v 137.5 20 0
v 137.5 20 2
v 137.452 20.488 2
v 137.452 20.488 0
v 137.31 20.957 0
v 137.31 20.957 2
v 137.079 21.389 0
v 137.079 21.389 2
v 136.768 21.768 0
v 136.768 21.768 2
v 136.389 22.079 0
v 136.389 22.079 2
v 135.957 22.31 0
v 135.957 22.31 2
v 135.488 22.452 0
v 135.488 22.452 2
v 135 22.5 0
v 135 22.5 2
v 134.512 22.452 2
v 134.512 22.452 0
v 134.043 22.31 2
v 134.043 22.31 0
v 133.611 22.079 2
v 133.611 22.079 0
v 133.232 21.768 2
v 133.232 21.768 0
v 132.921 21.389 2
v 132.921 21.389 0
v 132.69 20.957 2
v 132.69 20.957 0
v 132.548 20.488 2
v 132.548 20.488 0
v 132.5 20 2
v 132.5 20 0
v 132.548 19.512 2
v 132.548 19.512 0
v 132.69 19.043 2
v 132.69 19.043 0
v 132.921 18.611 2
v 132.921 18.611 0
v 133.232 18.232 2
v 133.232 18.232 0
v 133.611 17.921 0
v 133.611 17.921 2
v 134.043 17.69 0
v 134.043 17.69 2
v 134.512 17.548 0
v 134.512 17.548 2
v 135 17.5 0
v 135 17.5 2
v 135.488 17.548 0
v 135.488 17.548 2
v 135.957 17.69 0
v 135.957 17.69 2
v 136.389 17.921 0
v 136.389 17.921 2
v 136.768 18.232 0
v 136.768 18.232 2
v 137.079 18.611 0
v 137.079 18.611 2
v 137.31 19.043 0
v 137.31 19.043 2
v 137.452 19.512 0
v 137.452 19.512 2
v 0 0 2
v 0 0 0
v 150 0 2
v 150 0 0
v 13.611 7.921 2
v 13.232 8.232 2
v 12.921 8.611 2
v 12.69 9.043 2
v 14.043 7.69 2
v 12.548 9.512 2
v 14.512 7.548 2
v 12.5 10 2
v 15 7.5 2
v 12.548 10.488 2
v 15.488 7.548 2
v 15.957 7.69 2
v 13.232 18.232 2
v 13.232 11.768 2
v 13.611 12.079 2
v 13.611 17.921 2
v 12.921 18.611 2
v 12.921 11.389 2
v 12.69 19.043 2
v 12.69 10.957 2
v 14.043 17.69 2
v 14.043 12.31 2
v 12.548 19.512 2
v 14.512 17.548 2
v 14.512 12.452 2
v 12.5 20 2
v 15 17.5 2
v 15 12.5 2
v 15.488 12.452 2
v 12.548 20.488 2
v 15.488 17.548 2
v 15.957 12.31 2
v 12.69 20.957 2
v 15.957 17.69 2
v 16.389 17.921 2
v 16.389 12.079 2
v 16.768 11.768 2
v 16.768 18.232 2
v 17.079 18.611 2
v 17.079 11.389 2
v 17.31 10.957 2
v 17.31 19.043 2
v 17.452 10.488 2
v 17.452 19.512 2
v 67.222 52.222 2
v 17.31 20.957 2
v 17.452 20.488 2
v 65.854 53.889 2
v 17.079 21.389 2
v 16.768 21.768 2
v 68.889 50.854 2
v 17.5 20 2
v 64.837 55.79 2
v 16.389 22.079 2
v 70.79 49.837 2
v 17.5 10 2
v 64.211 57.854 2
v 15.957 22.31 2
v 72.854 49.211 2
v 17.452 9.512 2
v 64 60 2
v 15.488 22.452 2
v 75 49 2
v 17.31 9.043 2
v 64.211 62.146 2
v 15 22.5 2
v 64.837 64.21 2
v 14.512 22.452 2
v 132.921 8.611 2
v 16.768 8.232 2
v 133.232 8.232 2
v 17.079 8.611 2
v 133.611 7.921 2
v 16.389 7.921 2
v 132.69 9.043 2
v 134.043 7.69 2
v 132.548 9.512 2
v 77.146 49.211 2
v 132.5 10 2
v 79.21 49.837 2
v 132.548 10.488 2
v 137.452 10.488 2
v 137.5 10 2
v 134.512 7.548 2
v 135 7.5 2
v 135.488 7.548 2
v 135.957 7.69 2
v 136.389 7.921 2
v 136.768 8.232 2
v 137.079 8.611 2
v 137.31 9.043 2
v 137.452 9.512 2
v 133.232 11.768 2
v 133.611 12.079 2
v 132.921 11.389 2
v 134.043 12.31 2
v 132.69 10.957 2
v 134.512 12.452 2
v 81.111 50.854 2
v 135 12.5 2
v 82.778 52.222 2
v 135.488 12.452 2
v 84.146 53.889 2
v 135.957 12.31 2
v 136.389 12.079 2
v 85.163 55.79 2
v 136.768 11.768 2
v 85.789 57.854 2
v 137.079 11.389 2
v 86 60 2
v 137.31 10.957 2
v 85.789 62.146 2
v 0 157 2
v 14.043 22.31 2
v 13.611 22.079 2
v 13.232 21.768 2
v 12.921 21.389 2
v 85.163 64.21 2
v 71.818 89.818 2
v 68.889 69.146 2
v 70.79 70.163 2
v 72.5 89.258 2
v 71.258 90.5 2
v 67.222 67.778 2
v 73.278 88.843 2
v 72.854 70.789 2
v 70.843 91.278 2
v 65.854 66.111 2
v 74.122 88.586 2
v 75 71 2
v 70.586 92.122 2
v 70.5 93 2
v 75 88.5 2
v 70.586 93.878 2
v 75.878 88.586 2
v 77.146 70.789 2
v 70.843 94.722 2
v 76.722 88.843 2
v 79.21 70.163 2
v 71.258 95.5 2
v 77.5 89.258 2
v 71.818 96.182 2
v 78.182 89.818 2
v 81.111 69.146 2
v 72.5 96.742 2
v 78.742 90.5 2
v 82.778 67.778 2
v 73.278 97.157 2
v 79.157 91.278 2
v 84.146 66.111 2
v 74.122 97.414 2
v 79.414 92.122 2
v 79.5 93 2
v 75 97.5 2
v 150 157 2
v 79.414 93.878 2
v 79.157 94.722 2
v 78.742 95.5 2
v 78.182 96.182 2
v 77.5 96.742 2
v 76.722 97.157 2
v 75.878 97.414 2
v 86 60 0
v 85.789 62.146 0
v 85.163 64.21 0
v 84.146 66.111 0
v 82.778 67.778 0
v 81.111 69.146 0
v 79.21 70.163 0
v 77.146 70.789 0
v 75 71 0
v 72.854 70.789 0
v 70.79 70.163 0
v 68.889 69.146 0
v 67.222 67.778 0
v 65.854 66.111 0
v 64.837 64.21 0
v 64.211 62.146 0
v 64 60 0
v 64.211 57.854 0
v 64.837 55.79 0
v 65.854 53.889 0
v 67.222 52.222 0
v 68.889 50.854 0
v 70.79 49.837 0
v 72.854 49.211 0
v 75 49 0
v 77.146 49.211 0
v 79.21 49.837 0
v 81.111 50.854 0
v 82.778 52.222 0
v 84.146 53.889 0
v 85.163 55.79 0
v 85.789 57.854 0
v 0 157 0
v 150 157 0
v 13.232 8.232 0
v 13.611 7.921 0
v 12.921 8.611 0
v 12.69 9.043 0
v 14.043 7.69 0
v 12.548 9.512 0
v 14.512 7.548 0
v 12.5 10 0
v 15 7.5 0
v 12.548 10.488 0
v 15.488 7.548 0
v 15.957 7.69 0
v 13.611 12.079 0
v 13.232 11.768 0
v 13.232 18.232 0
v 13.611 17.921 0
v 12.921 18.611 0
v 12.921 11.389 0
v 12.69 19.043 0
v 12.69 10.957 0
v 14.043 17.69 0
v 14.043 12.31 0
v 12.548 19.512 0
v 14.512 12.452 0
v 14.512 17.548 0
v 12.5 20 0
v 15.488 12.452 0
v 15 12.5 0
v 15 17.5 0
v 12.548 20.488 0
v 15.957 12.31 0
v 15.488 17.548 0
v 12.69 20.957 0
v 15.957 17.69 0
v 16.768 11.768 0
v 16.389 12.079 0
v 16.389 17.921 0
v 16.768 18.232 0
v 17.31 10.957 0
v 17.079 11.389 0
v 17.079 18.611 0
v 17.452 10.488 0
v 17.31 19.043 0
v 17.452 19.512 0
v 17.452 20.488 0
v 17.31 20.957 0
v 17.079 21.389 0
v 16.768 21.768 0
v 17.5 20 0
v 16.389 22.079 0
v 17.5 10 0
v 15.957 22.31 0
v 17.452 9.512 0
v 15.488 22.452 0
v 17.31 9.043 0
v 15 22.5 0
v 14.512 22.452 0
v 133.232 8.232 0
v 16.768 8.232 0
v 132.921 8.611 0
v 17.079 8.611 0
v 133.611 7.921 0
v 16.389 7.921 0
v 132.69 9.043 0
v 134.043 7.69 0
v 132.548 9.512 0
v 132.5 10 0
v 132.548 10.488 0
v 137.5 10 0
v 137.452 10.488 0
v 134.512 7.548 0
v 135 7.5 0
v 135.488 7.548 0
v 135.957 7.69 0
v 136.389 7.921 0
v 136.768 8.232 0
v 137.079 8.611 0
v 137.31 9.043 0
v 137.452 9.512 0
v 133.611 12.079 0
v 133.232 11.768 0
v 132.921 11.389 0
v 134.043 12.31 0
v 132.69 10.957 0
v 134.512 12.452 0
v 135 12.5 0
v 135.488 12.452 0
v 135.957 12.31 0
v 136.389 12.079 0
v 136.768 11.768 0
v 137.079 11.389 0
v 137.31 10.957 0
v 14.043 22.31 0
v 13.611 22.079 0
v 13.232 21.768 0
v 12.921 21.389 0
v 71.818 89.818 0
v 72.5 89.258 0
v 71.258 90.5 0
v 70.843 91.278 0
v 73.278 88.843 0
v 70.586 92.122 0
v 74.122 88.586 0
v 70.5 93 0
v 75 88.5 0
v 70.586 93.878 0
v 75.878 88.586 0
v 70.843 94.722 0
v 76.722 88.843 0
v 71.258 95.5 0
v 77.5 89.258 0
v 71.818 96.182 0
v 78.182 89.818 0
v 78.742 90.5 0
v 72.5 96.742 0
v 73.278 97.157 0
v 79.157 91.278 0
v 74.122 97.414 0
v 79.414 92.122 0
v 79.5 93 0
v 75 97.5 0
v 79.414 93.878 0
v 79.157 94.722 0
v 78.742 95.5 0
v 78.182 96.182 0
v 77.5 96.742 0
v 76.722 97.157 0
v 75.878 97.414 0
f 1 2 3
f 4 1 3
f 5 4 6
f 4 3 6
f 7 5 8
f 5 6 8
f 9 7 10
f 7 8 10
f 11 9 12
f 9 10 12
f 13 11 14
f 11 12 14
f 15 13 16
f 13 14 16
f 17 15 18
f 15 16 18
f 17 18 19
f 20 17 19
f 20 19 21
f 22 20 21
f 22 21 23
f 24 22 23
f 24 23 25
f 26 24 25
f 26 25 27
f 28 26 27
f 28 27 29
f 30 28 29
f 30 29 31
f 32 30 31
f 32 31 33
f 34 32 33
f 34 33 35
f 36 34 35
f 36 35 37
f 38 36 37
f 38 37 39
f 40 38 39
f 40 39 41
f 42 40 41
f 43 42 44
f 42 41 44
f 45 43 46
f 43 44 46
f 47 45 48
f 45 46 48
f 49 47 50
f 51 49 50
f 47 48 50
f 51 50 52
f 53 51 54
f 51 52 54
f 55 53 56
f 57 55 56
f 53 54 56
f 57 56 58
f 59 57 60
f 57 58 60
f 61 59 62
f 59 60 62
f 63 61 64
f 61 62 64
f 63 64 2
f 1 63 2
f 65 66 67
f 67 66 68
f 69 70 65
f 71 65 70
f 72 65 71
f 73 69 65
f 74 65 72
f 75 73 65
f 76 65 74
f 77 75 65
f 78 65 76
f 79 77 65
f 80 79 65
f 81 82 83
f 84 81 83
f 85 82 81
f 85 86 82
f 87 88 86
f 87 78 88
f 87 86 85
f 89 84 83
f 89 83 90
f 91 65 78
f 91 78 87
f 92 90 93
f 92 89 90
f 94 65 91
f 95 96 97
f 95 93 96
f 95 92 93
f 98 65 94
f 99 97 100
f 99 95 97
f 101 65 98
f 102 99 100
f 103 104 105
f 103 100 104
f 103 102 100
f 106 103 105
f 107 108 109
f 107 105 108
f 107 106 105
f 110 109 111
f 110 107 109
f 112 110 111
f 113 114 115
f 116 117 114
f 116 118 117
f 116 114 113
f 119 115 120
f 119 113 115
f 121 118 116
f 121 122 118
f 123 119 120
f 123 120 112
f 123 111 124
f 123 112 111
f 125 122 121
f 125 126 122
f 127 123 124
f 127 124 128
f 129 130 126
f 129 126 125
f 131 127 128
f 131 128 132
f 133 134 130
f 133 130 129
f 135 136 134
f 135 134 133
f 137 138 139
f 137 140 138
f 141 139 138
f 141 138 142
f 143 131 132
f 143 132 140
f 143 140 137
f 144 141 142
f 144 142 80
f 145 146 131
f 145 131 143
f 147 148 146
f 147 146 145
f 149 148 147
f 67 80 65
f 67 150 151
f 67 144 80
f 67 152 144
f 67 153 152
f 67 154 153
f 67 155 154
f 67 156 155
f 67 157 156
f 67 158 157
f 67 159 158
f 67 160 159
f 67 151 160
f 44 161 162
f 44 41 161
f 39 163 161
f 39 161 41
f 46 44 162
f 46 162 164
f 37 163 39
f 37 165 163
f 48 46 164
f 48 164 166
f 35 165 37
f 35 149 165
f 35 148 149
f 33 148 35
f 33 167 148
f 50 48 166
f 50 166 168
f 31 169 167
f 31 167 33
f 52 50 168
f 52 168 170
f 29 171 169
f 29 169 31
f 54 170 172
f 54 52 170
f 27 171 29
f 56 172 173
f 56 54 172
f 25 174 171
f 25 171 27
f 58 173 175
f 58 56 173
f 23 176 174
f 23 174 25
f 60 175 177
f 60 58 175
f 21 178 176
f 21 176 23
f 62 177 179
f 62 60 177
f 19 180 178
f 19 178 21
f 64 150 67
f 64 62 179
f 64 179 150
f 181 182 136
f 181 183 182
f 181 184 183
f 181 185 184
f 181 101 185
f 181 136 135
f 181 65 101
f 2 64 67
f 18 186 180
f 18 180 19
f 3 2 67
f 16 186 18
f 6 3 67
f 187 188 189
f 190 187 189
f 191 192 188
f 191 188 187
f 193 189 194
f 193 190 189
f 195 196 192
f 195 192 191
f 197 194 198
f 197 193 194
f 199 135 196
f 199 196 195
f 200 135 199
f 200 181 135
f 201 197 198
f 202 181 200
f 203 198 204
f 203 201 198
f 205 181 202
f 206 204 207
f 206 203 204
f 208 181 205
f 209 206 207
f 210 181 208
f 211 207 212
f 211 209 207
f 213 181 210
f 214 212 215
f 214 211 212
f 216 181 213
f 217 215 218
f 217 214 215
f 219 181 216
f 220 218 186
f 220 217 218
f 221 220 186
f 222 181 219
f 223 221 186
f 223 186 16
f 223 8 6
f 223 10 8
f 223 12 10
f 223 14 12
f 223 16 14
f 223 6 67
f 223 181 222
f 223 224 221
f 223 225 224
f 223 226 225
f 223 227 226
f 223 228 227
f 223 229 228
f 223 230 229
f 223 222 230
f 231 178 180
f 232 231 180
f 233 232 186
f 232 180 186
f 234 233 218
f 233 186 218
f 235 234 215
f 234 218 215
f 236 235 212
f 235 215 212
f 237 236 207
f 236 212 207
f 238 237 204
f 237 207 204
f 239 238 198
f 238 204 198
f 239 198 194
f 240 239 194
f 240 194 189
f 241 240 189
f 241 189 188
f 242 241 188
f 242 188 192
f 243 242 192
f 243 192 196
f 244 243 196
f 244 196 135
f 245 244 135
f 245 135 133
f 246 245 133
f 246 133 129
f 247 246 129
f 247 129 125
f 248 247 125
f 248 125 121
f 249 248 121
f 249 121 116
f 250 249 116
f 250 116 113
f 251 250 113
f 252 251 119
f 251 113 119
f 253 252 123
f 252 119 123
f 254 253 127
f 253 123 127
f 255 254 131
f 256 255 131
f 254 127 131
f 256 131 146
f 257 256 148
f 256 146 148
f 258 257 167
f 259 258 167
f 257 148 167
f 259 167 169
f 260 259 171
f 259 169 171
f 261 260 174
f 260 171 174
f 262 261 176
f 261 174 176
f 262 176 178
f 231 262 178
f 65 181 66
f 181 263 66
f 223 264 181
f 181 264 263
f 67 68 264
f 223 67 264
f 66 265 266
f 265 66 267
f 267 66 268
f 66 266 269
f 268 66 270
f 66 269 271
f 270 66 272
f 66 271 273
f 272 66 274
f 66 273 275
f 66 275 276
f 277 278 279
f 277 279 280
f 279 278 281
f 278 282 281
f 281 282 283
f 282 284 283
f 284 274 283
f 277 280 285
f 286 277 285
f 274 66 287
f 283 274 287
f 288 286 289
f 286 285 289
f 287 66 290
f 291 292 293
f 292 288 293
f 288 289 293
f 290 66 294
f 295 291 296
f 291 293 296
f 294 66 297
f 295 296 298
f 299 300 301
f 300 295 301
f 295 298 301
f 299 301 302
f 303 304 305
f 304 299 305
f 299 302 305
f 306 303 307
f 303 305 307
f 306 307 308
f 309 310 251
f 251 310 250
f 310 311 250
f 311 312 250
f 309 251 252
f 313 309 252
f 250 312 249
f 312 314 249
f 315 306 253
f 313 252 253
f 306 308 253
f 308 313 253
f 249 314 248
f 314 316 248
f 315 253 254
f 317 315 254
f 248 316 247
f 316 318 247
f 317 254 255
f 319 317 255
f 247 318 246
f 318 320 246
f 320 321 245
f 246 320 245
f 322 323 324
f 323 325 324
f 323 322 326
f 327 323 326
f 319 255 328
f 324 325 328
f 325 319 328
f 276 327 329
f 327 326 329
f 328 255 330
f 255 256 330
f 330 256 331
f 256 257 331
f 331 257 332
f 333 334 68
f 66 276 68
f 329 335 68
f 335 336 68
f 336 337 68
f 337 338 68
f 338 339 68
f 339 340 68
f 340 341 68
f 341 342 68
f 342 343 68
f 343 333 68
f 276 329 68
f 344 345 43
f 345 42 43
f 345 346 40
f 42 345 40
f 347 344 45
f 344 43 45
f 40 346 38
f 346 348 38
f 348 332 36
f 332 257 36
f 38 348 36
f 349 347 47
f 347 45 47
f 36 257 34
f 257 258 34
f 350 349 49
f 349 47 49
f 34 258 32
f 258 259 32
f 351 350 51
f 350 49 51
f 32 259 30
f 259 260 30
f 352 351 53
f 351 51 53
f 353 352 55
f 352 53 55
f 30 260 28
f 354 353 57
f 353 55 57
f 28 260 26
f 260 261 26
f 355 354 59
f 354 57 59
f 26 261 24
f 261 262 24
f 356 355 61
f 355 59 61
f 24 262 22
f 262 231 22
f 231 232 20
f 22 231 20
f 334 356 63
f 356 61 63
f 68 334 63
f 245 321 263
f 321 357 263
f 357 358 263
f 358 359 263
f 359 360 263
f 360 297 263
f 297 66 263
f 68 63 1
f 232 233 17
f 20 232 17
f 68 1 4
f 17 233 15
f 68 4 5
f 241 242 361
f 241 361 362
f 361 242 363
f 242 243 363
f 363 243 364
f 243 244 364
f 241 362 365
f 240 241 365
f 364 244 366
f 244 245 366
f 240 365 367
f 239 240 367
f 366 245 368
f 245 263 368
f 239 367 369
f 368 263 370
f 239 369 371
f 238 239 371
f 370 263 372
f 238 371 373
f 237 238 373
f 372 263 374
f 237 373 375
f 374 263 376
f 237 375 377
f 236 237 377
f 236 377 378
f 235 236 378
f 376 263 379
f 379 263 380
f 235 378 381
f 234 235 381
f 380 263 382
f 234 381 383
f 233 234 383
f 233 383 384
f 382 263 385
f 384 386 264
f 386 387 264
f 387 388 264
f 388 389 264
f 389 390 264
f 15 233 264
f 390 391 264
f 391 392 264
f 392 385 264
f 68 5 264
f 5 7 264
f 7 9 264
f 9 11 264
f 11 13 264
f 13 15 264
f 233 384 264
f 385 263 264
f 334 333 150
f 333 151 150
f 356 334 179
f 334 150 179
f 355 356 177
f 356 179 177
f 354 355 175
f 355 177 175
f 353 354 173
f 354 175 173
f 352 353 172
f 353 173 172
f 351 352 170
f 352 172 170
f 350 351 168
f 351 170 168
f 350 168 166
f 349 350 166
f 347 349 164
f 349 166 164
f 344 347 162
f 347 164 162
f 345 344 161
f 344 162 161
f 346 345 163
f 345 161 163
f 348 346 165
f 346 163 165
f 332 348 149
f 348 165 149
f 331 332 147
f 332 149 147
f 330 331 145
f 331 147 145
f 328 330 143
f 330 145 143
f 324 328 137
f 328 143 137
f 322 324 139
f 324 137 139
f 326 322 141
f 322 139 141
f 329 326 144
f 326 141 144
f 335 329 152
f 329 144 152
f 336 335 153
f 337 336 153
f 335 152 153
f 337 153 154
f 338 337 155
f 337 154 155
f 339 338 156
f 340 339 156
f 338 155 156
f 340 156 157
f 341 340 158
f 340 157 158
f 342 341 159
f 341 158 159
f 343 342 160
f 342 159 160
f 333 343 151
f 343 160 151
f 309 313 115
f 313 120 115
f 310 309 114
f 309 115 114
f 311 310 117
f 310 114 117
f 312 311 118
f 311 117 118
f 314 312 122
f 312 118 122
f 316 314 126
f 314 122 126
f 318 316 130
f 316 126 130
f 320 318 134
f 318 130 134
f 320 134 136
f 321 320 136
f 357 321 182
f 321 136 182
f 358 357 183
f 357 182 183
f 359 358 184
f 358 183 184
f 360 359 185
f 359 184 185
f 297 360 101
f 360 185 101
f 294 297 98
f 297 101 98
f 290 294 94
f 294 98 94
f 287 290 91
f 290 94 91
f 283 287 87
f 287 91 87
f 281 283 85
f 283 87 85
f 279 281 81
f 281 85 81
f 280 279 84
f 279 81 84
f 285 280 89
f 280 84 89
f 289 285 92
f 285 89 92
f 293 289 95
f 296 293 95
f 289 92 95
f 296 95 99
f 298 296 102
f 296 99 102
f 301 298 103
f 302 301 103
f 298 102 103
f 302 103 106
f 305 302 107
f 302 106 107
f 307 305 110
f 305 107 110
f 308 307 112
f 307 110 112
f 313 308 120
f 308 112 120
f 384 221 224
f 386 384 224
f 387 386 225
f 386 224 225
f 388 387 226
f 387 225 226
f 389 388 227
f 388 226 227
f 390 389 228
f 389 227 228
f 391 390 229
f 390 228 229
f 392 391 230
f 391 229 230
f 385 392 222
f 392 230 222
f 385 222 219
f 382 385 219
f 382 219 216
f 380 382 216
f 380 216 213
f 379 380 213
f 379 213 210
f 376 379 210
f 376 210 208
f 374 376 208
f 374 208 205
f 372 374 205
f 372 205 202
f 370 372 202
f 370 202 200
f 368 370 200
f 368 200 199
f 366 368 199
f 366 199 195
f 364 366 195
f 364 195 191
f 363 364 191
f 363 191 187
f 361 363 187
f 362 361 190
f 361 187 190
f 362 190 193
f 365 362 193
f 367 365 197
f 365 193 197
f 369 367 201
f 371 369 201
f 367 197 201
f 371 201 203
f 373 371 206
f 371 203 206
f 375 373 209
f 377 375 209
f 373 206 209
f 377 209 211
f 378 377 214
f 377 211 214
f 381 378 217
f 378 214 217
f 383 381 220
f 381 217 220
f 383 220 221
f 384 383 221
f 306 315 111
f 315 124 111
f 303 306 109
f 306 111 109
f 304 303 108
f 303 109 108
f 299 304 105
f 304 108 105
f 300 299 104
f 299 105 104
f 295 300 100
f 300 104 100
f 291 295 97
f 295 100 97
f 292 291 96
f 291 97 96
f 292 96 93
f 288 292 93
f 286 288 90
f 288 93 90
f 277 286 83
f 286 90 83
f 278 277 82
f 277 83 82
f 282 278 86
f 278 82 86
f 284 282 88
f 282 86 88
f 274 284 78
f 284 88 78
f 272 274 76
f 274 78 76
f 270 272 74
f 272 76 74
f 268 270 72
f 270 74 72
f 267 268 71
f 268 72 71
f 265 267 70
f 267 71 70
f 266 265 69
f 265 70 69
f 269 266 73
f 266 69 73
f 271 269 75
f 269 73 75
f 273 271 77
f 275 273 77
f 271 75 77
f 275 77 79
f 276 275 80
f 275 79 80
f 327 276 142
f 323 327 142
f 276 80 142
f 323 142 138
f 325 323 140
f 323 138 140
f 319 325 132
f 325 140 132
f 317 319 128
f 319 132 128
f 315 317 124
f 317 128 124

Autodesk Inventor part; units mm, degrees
ref_plane "YZ Plane" through (0, 0, 0) normal (1, 0, 0) x (0, 1, 0)
ref_plane "XZ Plane" through (0, 0, 0) normal (0, 1, 0) x (-1, 0, 0)
ref_plane "XY Plane" through (0, 0, 0) normal (0, 0, 1) x (1, 0, 0)
sketch "Sketch1" plane through (0, 0, 0) normal (0, 0, 1) x (1, 0, 0)
  line L0 (0, 0) -> (150, 0)
  line L1 (150, 0) -> (150, 157)
  line L2 (150, 157) -> (0, 157)
  line L3 (0, 157) -> (0, 0)
  dimension "d0" = 157
  dimension "d1" = 150
extrude "Plate1" add sketch "Sketch1" along normal blind 2
sketch "Sketch2" plane through (0, 0, 2) normal (0, 0, 1) x (1, 0, 0)
  line L0 (0, 0) -> (0, 157) projected
  line L1 (0, 157) -> (150, 157) projected
  circle A0 centre (75, 60) radius 11
  line L2 (150, 0) -> (0, 0) projected
  line L3 (150, 157) -> (150, 0) projected
  circle A1 centre (15, 10) radius 2.5
  circle A2 centre (15, 20) radius 2.5
  line L4 (75, 0) -> (75, 157) construction
  circle A3 centre (135, 10) radius 2.5
  circle A4 centre (135, 20) radius 2.5
  circle A5 centre (75, 93) radius 4.5
  point P0 (0, 78.5)
  dimension "d3" = 22
  dimension "d6" = 5
  dimension "d7" = 5
  dimension "d8" = 15
  dimension "d9" = 10
  dimension "d10" = 10
  dimension "d11" = 9
  dimension "d12" = 33
  dimension "d13" = 60
extrude "Extrusion1" cut sketch "Sketch2" against normal through all contours A0 | A1 | A2 | A3 | A4 | A5
equation "\"BendRadius\" = Thickness"
equation "\"BendReliefWidth\" = Thickness"
equation "\"BendReliefDepth\" = 0.5 * Thickness"
equation "\"CornerReliefSize\" = 4 * Thickness"
equation "\"MinimumRemnant\" = 2 * Thickness"
equation "\"TransitionRadius\" = BendRadius"
equation "\"JacobiRadiusSize\" = BendRadius"
equation "\"GapSize\" = Thickness"
equation "\"d2\" = BendRadius"
equation "\"Thickness\" = 2"
properties part number "SensorPlatta"
